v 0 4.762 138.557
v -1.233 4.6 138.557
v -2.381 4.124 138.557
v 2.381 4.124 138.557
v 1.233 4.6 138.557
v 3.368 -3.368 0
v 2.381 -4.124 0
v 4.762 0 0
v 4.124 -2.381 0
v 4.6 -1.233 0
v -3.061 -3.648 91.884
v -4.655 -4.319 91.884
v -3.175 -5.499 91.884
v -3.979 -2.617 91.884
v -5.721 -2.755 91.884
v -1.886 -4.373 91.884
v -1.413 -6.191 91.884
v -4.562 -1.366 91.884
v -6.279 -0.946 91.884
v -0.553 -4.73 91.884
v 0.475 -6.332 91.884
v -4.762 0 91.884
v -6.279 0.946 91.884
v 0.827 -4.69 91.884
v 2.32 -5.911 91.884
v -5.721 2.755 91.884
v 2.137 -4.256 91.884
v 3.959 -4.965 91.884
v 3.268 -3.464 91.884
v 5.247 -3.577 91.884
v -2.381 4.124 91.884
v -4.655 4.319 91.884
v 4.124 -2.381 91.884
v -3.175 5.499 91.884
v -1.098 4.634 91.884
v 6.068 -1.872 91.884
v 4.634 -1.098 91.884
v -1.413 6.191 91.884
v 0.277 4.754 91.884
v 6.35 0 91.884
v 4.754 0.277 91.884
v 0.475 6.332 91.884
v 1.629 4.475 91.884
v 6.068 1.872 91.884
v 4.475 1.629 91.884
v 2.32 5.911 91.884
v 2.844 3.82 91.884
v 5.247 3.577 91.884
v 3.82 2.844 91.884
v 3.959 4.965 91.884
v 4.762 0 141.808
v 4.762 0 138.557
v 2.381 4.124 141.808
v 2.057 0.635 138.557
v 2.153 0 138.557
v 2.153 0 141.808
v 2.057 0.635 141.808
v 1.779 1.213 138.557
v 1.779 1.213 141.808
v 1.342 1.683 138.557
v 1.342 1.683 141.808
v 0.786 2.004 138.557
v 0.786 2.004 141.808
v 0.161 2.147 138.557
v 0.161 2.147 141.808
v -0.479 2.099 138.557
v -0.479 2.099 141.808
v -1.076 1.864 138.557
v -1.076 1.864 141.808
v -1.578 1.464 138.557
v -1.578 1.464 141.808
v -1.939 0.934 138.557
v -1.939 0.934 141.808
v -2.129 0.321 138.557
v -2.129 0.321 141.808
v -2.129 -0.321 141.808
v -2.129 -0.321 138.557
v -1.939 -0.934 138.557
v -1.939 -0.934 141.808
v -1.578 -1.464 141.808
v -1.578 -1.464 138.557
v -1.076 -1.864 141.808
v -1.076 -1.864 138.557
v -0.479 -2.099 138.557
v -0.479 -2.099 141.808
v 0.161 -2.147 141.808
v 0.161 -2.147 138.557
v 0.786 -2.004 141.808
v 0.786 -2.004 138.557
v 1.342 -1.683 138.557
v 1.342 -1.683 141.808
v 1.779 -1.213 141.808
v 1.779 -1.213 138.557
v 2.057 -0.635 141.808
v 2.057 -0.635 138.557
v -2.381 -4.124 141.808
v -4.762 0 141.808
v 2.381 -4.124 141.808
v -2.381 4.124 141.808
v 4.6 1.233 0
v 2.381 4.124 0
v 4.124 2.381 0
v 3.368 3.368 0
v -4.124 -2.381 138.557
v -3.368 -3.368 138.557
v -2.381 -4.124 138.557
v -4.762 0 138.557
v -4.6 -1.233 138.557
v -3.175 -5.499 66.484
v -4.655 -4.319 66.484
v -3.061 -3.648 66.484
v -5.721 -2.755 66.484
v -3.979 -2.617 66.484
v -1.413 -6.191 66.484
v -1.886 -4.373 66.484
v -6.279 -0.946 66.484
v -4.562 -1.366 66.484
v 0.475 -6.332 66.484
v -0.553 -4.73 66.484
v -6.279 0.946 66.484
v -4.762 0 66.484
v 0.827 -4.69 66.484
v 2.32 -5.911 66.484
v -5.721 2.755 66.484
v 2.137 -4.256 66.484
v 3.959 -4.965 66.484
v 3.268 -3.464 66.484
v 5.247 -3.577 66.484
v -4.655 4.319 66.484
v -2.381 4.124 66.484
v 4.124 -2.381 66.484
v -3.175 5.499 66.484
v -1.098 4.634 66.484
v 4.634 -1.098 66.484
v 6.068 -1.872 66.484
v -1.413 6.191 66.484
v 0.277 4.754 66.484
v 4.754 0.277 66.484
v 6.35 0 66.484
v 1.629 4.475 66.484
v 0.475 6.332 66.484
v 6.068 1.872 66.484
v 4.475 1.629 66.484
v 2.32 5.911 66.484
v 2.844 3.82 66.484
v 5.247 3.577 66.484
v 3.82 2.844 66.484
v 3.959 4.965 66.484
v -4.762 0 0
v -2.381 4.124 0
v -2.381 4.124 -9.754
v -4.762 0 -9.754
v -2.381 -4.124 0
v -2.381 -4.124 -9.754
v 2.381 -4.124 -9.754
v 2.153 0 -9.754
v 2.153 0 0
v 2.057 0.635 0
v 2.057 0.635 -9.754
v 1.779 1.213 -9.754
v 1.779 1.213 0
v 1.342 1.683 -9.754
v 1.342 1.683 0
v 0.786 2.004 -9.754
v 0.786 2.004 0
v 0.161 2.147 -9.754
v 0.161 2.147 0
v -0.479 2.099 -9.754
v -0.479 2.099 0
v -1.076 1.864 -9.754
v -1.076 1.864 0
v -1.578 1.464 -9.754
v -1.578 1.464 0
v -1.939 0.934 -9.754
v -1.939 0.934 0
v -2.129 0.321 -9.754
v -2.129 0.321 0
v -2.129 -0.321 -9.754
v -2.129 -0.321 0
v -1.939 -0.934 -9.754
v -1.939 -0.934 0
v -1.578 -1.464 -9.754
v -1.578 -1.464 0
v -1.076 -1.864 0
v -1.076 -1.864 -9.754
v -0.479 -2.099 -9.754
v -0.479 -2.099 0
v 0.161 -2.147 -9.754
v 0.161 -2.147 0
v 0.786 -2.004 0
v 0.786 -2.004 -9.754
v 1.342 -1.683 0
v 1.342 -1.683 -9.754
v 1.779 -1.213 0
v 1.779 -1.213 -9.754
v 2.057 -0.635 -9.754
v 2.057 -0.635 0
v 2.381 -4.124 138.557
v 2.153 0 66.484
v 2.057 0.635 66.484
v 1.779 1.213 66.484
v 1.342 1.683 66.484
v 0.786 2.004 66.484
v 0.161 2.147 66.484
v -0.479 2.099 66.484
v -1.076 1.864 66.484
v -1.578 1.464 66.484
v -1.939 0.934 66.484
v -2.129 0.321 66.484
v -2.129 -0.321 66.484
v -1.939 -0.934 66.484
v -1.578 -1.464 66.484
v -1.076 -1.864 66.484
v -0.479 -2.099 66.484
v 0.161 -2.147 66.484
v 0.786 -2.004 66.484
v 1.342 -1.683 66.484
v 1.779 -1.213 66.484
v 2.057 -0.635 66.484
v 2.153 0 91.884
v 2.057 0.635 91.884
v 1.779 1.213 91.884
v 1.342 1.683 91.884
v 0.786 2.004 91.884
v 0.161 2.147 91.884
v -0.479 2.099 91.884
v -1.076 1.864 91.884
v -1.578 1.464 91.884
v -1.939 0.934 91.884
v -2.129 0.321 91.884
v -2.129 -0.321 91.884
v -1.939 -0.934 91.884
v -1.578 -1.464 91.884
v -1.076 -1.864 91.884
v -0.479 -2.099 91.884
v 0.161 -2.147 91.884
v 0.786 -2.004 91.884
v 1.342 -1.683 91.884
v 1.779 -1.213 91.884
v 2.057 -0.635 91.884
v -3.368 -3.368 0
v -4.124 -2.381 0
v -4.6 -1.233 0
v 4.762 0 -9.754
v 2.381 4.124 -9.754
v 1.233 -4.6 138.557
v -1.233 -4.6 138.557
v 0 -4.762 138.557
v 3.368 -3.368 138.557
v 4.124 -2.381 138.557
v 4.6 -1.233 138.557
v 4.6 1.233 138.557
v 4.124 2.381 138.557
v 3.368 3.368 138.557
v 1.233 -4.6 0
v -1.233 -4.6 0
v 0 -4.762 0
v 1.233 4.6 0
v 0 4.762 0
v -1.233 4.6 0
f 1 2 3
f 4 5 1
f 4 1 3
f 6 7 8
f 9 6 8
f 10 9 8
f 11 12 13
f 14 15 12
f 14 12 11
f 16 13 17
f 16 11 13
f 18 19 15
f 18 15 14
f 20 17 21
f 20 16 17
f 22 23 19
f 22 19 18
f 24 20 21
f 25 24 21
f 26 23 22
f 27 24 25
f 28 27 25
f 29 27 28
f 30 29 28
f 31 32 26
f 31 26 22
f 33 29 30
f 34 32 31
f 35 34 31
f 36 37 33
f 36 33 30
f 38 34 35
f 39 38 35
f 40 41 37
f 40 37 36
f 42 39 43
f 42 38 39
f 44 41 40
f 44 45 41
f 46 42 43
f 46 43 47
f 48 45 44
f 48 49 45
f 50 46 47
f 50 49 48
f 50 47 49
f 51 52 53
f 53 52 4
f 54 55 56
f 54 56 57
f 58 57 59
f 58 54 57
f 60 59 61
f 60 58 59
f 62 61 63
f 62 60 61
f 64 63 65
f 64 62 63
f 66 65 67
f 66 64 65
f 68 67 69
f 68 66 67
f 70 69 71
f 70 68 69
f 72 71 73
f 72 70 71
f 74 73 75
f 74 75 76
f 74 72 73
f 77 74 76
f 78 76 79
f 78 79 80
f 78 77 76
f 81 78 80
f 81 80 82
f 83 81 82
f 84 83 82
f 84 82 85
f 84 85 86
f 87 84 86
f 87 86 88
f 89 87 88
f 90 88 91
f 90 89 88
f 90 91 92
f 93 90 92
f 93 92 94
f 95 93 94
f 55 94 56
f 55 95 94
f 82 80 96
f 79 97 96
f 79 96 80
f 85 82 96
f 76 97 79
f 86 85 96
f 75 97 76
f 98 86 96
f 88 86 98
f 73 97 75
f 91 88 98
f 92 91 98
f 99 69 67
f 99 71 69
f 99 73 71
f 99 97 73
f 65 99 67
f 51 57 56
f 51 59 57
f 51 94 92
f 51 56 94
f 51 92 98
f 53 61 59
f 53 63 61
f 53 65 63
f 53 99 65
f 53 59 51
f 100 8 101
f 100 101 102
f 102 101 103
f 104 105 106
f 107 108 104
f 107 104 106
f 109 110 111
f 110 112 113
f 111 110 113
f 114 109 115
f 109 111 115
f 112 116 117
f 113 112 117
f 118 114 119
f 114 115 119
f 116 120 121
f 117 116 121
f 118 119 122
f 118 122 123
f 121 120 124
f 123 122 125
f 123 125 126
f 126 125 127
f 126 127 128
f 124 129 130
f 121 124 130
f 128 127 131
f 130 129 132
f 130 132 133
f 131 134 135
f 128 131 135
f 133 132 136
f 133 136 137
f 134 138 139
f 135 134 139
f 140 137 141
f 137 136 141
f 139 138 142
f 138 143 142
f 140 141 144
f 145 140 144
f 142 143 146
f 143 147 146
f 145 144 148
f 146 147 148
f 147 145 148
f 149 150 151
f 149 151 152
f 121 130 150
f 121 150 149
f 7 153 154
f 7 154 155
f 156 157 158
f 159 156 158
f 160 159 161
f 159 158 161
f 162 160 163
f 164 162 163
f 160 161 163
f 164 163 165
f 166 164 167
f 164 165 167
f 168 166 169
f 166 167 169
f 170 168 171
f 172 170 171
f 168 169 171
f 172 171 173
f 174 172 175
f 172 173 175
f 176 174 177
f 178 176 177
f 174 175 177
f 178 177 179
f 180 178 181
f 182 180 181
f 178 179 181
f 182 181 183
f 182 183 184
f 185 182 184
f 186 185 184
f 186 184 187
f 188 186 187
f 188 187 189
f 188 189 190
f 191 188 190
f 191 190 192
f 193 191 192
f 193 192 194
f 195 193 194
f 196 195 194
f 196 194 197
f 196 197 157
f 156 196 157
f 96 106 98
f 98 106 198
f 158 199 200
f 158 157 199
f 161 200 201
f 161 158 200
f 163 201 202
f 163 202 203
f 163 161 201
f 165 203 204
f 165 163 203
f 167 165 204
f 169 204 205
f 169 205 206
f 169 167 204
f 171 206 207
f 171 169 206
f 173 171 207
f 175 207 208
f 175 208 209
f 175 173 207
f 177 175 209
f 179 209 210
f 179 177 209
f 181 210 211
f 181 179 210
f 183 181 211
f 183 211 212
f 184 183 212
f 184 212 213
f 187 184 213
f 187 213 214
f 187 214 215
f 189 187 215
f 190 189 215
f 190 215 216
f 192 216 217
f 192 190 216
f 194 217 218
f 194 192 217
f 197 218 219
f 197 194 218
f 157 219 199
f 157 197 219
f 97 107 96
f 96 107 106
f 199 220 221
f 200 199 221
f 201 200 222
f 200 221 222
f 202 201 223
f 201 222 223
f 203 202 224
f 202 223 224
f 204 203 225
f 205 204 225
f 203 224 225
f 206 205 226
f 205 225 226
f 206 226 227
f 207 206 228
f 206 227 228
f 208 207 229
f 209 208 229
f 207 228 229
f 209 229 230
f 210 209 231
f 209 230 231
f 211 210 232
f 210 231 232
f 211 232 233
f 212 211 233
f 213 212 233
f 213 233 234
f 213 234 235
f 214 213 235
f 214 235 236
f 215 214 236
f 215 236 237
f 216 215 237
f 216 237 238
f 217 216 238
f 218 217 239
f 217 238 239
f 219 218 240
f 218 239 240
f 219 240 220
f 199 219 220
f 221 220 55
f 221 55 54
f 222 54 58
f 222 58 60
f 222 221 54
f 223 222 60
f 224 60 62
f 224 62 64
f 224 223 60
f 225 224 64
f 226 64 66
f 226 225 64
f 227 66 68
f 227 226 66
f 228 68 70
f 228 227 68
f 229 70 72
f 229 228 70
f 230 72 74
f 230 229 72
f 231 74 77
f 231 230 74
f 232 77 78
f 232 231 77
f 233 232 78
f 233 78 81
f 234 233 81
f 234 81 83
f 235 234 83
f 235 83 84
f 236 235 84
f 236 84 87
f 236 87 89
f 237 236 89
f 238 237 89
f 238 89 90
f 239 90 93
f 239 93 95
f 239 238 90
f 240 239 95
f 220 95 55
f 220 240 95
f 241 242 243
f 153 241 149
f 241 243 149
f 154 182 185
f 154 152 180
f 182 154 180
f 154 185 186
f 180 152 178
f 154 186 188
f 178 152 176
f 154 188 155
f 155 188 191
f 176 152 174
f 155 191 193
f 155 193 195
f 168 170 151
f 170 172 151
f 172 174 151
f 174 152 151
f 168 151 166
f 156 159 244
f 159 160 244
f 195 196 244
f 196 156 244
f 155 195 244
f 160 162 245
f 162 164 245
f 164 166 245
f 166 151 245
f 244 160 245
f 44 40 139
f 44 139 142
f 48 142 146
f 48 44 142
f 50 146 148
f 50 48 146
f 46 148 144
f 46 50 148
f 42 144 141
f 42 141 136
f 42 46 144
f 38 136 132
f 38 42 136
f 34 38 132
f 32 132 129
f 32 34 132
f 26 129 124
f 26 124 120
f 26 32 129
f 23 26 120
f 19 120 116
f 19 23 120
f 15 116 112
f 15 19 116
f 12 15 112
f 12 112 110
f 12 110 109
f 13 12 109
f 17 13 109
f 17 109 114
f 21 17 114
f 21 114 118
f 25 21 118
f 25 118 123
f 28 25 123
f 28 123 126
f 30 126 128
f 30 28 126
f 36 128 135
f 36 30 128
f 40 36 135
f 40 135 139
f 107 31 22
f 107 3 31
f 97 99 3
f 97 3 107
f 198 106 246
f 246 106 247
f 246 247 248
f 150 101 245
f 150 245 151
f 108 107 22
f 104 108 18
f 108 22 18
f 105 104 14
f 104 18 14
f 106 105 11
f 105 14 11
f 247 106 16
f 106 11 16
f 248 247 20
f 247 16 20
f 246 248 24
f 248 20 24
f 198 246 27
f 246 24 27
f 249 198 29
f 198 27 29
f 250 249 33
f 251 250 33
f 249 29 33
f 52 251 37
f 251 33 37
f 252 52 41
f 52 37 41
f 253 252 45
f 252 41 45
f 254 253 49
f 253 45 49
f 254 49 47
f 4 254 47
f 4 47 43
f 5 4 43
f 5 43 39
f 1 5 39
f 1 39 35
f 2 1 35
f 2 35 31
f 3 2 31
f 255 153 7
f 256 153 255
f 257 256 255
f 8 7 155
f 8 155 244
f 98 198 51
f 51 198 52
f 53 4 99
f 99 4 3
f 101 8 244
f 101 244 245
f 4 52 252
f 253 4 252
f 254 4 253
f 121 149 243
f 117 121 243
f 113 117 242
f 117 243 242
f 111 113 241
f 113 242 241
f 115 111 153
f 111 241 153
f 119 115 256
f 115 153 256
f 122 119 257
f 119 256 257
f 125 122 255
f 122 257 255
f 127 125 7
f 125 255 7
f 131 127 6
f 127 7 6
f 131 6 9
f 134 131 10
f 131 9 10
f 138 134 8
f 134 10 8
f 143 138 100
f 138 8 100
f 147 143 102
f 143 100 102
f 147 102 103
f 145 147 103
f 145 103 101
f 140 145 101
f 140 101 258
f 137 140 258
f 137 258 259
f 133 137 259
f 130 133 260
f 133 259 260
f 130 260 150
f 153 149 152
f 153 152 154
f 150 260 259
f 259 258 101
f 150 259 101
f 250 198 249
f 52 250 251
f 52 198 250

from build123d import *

# Parameters (mm, degrees)
F0_R          = 4.7625
F0_R_2        = 2.15265
F1_DEPTH      = 138.557
F3_R          = 2.15265
F4_DEPTH      = 3.2512
F4_DEPTH_BACK = 148.3106
F5_DEPTH      = 138.557
F7_R          = 6.35
F7_R_2        = 2.15265
F8_DEPTH      = 25.4


with BuildPart() as f1:
    # F0 (on Top) → F1 (new body)
    with BuildSketch(Plane.XY):
        Circle(F0_R)
        Circle(F0_R_2, mode=Mode.SUBTRACT)
    extrude(amount=F1_DEPTH)

    # F3 (on face) → F4 (join, two sides)
    with BuildSketch(Plane.XY.offset(138.557)) as f4_sk:
        Polygon((4.7625, 0), (2.38125, 4.1244459855), (-2.38125, 4.1244459855), (-4.7625, 0), (-2.38125, -4.1244459855), (2.38125, -4.1244459855), align=None)
        Circle(F3_R, mode=Mode.SUBTRACT)
    extrude(amount=F4_DEPTH)
    extrude(f4_sk.sketch, amount=-F4_DEPTH_BACK)

    # F5 (cut, through all): a face of the model
    f5_faces = [f1.faces().sort_by_distance(p)[0] for p in [
        (-3.7942237484, 2.1905961025, 138.557),
    ]]
    extrude(f5_faces, amount=-F5_DEPTH, mode=Mode.SUBTRACT)

    # F7 (on offset) → F8 (join)
    with BuildSketch(Plane.XY.offset(91.8845)):
        Circle(F7_R)
        Circle(F7_R_2, mode=Mode.SUBTRACT)
    extrude(amount=-F8_DEPTH)


solid = f1.part
